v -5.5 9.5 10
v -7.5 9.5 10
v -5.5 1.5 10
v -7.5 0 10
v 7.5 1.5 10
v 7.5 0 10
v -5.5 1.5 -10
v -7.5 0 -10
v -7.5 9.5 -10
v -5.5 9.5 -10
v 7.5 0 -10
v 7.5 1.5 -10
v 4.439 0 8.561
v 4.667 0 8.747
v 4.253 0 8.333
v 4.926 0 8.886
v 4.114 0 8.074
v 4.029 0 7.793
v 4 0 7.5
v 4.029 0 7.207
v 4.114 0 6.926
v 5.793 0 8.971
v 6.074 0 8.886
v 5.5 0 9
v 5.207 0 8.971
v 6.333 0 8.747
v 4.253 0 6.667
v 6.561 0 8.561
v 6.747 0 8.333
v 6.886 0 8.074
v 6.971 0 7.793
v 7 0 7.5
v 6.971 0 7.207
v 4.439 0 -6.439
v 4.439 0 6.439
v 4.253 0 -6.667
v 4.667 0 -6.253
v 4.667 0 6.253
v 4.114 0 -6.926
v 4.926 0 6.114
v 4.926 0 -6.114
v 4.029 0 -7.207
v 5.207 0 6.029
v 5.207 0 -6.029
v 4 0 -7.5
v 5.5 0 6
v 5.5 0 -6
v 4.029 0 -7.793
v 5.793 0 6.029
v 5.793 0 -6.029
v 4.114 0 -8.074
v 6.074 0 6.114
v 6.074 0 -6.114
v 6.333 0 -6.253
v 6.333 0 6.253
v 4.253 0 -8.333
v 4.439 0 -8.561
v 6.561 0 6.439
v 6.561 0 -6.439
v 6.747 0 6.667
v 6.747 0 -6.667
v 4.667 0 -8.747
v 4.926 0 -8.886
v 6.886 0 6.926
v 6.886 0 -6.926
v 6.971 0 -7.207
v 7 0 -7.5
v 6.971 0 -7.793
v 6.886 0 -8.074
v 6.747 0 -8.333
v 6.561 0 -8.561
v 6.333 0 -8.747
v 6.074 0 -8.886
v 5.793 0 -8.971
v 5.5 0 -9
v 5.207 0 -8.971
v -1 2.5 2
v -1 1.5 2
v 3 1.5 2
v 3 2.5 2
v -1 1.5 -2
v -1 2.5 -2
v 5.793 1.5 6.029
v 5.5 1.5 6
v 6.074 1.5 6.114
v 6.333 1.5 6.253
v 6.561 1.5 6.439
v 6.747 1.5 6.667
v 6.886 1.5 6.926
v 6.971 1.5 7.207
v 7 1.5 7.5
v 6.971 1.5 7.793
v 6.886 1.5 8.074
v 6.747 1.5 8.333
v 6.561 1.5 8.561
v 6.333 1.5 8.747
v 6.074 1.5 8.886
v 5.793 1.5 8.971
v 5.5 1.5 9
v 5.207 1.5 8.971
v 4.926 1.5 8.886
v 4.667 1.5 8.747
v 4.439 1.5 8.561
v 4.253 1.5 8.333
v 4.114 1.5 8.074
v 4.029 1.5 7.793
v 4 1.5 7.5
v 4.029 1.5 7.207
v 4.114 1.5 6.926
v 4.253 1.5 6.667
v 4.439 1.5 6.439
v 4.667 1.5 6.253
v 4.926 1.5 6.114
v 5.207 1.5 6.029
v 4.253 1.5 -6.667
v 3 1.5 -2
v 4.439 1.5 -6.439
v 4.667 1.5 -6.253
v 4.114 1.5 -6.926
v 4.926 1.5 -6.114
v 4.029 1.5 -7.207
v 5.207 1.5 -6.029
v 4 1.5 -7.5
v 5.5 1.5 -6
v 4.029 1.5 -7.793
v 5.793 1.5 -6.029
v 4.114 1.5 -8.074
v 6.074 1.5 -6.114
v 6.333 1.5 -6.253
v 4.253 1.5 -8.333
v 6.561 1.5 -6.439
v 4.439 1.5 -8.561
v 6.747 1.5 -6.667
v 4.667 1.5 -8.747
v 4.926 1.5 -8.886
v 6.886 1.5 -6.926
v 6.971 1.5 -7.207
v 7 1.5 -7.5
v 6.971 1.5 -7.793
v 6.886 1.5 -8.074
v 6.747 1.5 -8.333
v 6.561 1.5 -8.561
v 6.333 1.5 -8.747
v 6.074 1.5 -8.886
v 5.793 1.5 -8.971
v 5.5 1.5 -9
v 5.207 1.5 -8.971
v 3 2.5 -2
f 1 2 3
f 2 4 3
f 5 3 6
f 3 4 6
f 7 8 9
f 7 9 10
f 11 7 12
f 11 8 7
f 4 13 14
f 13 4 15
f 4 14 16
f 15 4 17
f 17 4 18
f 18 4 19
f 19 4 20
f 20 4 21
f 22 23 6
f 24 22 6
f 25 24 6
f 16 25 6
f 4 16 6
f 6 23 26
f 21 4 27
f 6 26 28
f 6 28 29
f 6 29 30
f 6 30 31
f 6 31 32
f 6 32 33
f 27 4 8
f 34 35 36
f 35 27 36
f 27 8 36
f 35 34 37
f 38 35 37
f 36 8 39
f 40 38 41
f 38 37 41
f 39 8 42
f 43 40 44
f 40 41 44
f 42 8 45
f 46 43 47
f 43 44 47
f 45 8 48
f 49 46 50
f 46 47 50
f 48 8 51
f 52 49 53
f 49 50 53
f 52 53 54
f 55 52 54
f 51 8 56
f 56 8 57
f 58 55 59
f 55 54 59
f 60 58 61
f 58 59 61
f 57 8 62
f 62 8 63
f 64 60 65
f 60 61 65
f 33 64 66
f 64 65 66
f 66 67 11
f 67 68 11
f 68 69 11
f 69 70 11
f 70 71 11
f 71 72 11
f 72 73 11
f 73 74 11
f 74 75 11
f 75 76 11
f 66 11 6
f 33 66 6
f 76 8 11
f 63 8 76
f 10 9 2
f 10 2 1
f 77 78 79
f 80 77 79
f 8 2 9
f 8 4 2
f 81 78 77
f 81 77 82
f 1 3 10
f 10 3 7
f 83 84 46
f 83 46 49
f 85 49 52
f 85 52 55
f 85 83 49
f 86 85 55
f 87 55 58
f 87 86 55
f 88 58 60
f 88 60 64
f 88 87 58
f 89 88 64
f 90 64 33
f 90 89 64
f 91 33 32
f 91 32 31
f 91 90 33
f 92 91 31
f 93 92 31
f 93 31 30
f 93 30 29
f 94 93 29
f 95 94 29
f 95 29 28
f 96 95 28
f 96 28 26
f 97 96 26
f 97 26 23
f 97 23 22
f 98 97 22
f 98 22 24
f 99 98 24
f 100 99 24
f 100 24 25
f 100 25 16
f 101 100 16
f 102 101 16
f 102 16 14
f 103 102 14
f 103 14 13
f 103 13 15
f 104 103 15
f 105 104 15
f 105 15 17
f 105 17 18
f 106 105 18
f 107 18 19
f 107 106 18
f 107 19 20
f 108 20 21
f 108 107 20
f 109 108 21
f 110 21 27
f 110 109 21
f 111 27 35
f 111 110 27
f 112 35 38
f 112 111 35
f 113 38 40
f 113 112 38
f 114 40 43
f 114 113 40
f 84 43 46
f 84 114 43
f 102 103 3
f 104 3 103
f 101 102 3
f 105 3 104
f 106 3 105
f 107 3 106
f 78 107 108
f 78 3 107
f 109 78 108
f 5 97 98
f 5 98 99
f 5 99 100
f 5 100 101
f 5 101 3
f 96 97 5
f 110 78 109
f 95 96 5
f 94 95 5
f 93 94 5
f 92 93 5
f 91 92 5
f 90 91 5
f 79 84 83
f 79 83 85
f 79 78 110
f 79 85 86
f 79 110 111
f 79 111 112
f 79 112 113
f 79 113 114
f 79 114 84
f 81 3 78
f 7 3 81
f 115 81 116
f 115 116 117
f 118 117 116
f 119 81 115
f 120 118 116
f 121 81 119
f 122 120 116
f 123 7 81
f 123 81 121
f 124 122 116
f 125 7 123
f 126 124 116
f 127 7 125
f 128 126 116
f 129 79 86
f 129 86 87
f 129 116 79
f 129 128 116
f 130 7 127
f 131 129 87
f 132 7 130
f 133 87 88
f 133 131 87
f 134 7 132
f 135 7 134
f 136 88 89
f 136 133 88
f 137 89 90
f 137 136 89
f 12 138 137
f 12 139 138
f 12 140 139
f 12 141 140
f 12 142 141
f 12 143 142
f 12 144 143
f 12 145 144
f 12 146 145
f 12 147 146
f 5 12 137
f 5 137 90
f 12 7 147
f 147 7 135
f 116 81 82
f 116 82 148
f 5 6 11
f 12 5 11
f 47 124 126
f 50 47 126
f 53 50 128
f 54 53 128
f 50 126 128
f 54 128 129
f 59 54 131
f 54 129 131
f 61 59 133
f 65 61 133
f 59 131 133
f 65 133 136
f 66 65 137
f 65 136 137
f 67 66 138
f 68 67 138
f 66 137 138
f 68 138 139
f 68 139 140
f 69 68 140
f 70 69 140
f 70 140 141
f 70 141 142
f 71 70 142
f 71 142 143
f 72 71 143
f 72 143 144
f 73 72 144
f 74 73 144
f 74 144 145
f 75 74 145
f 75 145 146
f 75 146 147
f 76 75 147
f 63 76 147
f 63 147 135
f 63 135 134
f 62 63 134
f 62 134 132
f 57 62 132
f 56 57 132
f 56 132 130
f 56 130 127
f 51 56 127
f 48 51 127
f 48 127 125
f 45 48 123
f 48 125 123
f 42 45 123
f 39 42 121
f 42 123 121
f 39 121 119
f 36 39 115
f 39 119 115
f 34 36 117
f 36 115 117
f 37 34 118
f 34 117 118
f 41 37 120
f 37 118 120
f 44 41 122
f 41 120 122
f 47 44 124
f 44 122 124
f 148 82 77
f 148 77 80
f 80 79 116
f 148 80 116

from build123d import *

# Parameters (mm, degrees)
ESQUISSE1_W             = 15
ESQUISSE1_H             = 20
BOSS_EXTRU_1_DEPTH      = 1.5
ENL_V_MAT_EXTRU_1_REACH = 14.59
ESQUISSE2_R             = 1.5
ESQUISSE3_W             = 2
ESQUISSE3_H             = 20
BOSS_EXTRU_2_DEPTH      = 8
ESQUISSE4_W             = 4
ESQUISSE4_H             = 4
BOSS_EXTRU_3_DEPTH      = 1


with BuildPart() as part:
    # Esquisse1 → Boss.-Extru.1 (new body)
    with BuildSketch(Plane(origin=(0, 0, 0), x_dir=(1, 0, 0), z_dir=(0, 1, 0))):
        Rectangle(ESQUISSE1_W, ESQUISSE1_H)
    extrude(amount=BOSS_EXTRU_1_DEPTH)

    # Esquisse2 → Enlèv. mat.-Extru.1 (cut, up to next)
    with BuildSketch(Plane(origin=(0, 1.5, 0), x_dir=(1, 0, 0), z_dir=(0, 1, 0)), mode=Mode.PRIVATE) as enl_v_mat_extru_1_sk1:
        with Locations(Location((5.5, 7.5, 0), (0, 0, 270))):
            Circle(ESQUISSE2_R)
    enl_v_mat_extru_1_tool1 = extrude(enl_v_mat_extru_1_sk1.sketch, amount=-ENL_V_MAT_EXTRU_1_REACH, mode=Mode.PRIVATE) & part.part
    enl_v_mat_extru_1 = enl_v_mat_extru_1_tool1.solids().sort_by_distance((5.5, 1.5, -7.5))[0]
    add(enl_v_mat_extru_1, mode=Mode.SUBTRACT)

    # Symétrie1: Enlèv. mat.-Extru.1 across plane
    add(enl_v_mat_extru_1.mirror(Plane.XY), mode=Mode.SUBTRACT)

    # Esquisse3 → Boss.-Extru.2 (add)
    with BuildSketch(Plane(origin=(0, 1.5, 0), x_dir=(1, 0, 0), z_dir=(0, 1, 0))):
        with Locations((-6.5, 0)):
            Rectangle(ESQUISSE3_W, ESQUISSE3_H)
    extrude(amount=BOSS_EXTRU_2_DEPTH)

    # Esquisse4 → Boss.-Extru.3 (add)
    with BuildSketch(Plane(origin=(0, 1.5, 0), x_dir=(1, 0, 0), z_dir=(0, 1, 0))):
        with Locations((1, 0)):
            Rectangle(ESQUISSE4_W, ESQUISSE4_H)
    extrude(amount=BOSS_EXTRU_3_DEPTH)


solid = part.part
